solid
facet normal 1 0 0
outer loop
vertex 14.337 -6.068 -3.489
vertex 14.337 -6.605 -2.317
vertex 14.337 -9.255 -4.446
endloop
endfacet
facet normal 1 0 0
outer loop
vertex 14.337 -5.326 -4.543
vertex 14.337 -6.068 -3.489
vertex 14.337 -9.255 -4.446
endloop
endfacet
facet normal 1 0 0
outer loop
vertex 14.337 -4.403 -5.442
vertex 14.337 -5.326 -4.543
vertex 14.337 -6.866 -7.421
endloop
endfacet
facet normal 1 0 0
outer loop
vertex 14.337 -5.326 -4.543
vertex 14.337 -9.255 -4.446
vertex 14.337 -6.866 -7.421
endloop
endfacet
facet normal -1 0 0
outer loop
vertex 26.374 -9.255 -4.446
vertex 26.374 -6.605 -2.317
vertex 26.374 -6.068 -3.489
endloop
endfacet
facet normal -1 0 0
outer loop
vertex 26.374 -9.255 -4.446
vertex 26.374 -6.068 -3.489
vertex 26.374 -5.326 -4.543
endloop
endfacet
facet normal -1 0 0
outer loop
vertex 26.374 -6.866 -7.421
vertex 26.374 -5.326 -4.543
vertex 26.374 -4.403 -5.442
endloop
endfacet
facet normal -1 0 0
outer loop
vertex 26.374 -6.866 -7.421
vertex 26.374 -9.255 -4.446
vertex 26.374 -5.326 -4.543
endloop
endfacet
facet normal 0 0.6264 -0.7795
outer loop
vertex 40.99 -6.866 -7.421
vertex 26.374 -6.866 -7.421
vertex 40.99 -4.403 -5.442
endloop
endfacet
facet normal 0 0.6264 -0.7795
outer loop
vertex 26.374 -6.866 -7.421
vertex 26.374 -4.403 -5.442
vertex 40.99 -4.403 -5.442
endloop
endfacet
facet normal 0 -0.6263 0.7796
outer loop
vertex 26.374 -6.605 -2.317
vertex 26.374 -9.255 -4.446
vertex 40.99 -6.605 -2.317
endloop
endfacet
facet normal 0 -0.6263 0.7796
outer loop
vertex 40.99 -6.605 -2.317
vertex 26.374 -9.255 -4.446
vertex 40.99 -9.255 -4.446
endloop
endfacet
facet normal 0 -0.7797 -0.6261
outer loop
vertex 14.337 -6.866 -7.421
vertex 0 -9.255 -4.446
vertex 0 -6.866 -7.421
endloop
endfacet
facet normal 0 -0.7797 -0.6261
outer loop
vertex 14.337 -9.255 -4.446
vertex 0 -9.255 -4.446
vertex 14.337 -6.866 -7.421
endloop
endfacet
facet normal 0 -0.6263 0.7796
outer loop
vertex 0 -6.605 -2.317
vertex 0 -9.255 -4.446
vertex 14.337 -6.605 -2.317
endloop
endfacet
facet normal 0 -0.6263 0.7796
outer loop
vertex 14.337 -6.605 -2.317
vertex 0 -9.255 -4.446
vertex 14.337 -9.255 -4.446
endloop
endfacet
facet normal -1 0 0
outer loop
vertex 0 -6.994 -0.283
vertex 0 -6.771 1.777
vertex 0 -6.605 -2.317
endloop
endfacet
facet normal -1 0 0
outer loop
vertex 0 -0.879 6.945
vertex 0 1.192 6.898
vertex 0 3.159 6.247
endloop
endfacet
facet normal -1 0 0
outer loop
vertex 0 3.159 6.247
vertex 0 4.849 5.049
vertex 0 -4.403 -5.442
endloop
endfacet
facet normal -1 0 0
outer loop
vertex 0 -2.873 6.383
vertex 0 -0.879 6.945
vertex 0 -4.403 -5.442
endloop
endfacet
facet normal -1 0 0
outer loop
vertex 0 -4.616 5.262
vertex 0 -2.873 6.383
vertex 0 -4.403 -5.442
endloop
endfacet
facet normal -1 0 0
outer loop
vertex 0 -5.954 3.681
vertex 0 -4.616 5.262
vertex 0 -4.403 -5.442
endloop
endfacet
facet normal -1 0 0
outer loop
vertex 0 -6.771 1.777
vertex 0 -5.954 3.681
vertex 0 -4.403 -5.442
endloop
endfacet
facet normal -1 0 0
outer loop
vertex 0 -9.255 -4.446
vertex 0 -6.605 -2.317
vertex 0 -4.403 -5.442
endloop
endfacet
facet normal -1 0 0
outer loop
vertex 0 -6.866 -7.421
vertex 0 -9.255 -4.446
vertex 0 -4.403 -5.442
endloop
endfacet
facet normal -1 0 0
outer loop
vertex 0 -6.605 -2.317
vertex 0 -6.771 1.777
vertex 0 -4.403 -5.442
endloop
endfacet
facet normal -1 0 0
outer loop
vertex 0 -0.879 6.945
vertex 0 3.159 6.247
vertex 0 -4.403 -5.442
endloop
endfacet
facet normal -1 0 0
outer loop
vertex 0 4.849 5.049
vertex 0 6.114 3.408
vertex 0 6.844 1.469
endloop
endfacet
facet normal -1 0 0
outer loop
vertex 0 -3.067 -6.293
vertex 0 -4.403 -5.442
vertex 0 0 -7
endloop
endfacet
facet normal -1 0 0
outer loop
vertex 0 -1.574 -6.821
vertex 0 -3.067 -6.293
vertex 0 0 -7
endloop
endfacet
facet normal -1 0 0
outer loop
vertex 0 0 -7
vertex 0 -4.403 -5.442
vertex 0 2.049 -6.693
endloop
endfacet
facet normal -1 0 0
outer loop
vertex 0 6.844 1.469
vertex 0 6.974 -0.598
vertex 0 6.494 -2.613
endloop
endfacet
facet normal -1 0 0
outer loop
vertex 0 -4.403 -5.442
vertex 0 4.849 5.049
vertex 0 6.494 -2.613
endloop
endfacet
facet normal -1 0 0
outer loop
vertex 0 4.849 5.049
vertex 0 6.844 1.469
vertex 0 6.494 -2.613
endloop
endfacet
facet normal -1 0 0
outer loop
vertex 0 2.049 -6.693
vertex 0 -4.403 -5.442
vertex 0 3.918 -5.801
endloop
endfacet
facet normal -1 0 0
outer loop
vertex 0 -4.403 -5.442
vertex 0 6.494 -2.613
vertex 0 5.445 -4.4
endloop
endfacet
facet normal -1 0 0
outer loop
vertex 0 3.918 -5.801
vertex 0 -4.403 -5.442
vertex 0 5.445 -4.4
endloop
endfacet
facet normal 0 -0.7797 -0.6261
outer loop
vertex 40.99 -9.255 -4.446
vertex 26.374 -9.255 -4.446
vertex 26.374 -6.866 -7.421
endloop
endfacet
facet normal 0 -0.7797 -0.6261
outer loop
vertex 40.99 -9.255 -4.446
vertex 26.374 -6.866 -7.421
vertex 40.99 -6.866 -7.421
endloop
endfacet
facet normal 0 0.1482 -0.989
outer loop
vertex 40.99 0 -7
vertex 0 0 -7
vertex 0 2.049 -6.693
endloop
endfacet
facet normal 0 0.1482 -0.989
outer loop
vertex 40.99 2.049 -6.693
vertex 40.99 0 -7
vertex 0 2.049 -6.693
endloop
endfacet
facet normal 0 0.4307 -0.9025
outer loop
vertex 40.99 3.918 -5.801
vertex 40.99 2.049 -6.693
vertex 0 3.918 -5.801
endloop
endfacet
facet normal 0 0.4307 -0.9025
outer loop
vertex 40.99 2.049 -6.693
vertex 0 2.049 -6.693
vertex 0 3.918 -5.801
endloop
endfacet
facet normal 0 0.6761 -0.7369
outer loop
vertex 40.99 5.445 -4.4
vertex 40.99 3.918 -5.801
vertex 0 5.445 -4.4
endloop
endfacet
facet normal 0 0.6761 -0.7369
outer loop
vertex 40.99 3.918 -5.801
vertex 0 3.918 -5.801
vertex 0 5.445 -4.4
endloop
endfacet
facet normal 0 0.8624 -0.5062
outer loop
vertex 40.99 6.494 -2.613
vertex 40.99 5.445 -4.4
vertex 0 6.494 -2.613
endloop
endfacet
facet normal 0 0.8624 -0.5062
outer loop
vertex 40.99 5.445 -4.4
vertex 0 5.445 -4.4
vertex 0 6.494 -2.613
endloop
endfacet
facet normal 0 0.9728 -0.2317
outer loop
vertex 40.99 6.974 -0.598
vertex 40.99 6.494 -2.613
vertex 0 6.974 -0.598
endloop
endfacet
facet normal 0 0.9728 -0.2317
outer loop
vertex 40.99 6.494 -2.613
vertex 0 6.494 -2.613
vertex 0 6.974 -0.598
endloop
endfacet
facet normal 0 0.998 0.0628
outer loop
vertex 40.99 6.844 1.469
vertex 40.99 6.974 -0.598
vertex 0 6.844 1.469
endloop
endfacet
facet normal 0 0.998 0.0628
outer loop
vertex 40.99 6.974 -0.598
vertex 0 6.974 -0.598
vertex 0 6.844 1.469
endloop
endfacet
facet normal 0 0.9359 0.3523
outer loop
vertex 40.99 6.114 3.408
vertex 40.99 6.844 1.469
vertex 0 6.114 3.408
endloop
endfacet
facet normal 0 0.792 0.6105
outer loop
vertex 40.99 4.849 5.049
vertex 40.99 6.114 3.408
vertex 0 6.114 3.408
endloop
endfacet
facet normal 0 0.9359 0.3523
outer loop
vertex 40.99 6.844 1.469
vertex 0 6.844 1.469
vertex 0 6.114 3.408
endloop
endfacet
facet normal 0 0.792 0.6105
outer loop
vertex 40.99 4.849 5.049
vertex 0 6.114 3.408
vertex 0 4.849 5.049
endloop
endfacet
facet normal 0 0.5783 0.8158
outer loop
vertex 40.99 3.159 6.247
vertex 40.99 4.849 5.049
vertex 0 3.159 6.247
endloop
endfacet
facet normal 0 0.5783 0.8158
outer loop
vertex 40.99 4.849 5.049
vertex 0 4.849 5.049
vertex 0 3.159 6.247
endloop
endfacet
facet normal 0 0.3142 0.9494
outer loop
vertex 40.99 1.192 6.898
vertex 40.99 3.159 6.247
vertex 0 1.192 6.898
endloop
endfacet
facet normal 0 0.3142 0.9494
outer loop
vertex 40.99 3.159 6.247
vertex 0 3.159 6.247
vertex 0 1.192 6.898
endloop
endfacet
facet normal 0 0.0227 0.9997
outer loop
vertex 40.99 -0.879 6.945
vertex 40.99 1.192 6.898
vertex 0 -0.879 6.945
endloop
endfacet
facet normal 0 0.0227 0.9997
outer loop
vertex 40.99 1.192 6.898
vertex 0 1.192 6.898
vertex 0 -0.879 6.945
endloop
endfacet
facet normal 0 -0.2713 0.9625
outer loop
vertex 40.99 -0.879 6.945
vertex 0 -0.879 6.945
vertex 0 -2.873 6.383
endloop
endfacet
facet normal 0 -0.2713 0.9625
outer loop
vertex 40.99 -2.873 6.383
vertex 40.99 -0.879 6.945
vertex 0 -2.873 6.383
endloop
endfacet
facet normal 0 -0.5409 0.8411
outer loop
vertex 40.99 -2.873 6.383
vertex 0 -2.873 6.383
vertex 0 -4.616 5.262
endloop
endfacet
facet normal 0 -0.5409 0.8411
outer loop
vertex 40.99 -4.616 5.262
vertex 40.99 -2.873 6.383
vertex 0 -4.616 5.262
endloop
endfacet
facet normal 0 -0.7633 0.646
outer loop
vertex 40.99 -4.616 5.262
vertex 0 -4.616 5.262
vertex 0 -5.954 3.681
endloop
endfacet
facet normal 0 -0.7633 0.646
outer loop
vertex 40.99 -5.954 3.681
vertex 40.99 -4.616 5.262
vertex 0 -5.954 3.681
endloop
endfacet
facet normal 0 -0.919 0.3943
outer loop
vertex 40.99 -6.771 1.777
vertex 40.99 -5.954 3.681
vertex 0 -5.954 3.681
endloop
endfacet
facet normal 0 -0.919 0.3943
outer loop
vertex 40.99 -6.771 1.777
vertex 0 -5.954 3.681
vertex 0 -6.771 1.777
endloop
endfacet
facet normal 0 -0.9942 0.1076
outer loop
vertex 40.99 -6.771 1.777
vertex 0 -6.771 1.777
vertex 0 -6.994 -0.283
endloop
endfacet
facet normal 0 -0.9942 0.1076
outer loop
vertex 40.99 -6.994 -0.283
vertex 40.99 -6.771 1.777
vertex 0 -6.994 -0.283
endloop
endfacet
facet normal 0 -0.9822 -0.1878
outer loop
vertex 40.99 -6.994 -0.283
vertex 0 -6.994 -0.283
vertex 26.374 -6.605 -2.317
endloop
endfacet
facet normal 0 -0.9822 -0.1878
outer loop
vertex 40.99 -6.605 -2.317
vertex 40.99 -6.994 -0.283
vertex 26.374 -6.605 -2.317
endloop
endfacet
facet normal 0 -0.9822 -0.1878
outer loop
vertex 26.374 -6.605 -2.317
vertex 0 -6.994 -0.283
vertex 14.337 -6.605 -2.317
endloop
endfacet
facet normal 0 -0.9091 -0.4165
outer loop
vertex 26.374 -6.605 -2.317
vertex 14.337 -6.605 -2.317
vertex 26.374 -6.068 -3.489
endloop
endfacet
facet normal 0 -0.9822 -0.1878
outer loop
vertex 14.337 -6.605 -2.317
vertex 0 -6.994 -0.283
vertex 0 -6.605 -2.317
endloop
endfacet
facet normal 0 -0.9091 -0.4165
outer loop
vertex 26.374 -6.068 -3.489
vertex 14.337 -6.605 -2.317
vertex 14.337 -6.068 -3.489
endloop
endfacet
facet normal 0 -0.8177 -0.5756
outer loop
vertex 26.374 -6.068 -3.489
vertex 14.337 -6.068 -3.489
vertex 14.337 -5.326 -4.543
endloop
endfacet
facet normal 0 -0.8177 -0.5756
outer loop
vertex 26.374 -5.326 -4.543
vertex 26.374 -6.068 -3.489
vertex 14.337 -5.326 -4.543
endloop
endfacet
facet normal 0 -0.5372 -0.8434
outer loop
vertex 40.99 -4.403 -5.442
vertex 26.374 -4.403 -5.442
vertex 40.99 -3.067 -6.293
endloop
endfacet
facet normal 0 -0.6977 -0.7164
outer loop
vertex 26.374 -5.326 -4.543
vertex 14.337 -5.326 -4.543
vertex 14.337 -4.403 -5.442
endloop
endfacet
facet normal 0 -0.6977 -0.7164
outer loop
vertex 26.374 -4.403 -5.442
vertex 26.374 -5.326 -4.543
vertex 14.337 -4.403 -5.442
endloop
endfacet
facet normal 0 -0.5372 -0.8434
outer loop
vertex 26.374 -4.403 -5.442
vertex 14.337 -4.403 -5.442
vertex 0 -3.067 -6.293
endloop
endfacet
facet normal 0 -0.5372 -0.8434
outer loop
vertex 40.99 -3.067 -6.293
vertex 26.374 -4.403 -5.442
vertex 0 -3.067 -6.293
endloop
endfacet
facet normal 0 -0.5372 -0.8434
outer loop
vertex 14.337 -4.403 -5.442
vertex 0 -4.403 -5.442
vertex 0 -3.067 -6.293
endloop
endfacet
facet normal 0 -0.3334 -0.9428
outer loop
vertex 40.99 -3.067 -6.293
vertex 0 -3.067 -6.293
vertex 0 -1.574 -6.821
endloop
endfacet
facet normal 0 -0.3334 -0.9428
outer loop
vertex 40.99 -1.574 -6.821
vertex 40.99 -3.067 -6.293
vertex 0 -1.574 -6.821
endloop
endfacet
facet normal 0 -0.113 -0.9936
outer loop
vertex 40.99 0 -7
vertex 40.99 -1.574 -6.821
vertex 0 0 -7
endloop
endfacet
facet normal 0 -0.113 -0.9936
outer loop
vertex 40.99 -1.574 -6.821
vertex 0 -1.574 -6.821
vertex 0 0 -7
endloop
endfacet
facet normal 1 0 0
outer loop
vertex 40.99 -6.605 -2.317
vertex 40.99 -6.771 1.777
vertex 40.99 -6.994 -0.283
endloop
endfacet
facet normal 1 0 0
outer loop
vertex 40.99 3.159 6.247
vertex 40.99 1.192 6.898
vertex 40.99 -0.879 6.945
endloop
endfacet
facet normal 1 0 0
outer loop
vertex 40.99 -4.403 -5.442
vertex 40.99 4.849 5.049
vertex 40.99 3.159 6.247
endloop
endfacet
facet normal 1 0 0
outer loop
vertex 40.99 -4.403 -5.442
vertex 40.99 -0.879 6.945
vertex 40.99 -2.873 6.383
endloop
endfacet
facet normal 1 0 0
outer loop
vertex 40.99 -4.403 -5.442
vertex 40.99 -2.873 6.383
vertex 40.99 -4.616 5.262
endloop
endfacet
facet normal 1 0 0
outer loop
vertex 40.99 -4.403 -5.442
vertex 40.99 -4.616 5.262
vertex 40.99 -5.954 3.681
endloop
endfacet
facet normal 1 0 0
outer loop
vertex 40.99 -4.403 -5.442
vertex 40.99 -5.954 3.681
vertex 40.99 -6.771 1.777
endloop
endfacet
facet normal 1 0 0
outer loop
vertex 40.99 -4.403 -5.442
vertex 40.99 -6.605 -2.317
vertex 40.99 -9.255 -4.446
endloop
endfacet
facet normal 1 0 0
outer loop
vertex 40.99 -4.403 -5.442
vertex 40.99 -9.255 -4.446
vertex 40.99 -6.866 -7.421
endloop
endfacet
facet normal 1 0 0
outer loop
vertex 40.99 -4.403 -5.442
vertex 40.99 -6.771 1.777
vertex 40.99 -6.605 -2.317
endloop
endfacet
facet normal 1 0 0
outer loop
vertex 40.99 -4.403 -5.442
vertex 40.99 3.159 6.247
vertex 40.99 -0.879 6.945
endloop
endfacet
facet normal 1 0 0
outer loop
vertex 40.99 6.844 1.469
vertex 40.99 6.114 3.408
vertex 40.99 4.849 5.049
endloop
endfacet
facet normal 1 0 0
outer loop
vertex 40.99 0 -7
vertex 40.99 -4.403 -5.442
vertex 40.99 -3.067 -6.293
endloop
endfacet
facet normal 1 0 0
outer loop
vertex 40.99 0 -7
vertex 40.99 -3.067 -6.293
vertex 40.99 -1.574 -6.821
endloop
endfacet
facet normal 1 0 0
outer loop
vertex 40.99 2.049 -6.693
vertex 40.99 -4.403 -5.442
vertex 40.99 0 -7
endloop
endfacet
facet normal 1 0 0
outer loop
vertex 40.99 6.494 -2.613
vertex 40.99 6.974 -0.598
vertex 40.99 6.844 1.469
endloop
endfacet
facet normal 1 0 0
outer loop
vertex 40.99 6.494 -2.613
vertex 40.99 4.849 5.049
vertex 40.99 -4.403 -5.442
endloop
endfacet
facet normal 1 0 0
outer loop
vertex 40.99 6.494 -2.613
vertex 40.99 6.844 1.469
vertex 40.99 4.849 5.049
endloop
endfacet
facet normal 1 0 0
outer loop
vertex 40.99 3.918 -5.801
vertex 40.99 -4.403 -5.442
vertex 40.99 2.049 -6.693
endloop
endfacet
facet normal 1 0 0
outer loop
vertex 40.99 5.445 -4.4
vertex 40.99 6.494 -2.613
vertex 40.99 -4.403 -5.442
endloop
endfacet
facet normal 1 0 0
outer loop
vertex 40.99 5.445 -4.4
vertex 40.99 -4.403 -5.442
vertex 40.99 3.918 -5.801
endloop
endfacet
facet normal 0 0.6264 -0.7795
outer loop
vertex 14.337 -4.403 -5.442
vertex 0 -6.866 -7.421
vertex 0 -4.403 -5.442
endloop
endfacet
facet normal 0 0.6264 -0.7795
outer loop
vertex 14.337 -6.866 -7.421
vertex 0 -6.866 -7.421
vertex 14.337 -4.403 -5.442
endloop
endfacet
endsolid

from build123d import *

# Parameters (mm, degrees)
SKETCH1_R             = 7
BOSS_EXTRUDE1_DEPTH   = 40.99
SKETCH2_W             = 14.337226175
SKETCH2_H             = 3.81556612
BOSS_EXTRUDE2_DEPTH   = 3
SKETCH2_W_2           = 14.616397067
BOSS_EXTRUDE2_2_DEPTH = 3
SKETCH3_W             = 14.616397067
SKETCH3_H             = 3.81556612
SKETCH3_W_2           = 14.337226175
BOSS_EXTRUDE3_DEPTH   = 10


with BuildPart() as part:
    # Sketch1 → Boss-Extrude1 (new body)
    with BuildSketch(Plane(origin=(0, 0, 0), x_dir=(0, 0, -1), z_dir=(1, 0, 0))):
        Circle(SKETCH1_R)
    extrude(amount=BOSS_EXTRUDE1_DEPTH)



with BuildPart() as body_2:
    # Sketch2 → Boss-Extrude2 (new body)
    with BuildSketch(Plane(origin=(0, -5.457447914, -4.383635737), x_dir=(1, 0, 0), z_dir=(0, -0.779635416, -0.626233677))):
        with Locations((7.168613088, 0.421848142)):
            Rectangle(SKETCH2_W, SKETCH2_H)
    extrude(amount=BOSS_EXTRUDE2_DEPTH)


with BuildPart() as body_3:
    # Sketch2 → Boss-Extrude2 2 (new body)
    with BuildSketch(Plane(origin=(0, -5.457447914, -4.383635737), x_dir=(1, 0, 0), z_dir=(0, -0.779635416, -0.626233677))):
        with Locations((33.681801467, 0.421848142)):
            Rectangle(SKETCH2_W_2, SKETCH2_H)
    extrude(amount=BOSS_EXTRUDE2_2_DEPTH)


with BuildPart() as part_1:
    add(part.part)

    add(body_2.part)  # Boss-Extrude3 merges body 2

    add(body_3.part)  # Boss-Extrude3 merges body 3
    # Sketch3 → Boss-Extrude3 (add)
    with BuildSketch(Plane(origin=(0, -5.457447914, -4.383635737), x_dir=(1, 0, 0), z_dir=(0, 0.779635416, 0.626233677))):
        with Locations((33.681801467, -0.421848142)):
            Rectangle(SKETCH3_W, SKETCH3_H)
        with Locations((7.168613088, -0.421848142)):
            Rectangle(SKETCH3_W_2, SKETCH3_H)
    extrude(amount=BOSS_EXTRUDE3_DEPTH)


solid = part_1.part
